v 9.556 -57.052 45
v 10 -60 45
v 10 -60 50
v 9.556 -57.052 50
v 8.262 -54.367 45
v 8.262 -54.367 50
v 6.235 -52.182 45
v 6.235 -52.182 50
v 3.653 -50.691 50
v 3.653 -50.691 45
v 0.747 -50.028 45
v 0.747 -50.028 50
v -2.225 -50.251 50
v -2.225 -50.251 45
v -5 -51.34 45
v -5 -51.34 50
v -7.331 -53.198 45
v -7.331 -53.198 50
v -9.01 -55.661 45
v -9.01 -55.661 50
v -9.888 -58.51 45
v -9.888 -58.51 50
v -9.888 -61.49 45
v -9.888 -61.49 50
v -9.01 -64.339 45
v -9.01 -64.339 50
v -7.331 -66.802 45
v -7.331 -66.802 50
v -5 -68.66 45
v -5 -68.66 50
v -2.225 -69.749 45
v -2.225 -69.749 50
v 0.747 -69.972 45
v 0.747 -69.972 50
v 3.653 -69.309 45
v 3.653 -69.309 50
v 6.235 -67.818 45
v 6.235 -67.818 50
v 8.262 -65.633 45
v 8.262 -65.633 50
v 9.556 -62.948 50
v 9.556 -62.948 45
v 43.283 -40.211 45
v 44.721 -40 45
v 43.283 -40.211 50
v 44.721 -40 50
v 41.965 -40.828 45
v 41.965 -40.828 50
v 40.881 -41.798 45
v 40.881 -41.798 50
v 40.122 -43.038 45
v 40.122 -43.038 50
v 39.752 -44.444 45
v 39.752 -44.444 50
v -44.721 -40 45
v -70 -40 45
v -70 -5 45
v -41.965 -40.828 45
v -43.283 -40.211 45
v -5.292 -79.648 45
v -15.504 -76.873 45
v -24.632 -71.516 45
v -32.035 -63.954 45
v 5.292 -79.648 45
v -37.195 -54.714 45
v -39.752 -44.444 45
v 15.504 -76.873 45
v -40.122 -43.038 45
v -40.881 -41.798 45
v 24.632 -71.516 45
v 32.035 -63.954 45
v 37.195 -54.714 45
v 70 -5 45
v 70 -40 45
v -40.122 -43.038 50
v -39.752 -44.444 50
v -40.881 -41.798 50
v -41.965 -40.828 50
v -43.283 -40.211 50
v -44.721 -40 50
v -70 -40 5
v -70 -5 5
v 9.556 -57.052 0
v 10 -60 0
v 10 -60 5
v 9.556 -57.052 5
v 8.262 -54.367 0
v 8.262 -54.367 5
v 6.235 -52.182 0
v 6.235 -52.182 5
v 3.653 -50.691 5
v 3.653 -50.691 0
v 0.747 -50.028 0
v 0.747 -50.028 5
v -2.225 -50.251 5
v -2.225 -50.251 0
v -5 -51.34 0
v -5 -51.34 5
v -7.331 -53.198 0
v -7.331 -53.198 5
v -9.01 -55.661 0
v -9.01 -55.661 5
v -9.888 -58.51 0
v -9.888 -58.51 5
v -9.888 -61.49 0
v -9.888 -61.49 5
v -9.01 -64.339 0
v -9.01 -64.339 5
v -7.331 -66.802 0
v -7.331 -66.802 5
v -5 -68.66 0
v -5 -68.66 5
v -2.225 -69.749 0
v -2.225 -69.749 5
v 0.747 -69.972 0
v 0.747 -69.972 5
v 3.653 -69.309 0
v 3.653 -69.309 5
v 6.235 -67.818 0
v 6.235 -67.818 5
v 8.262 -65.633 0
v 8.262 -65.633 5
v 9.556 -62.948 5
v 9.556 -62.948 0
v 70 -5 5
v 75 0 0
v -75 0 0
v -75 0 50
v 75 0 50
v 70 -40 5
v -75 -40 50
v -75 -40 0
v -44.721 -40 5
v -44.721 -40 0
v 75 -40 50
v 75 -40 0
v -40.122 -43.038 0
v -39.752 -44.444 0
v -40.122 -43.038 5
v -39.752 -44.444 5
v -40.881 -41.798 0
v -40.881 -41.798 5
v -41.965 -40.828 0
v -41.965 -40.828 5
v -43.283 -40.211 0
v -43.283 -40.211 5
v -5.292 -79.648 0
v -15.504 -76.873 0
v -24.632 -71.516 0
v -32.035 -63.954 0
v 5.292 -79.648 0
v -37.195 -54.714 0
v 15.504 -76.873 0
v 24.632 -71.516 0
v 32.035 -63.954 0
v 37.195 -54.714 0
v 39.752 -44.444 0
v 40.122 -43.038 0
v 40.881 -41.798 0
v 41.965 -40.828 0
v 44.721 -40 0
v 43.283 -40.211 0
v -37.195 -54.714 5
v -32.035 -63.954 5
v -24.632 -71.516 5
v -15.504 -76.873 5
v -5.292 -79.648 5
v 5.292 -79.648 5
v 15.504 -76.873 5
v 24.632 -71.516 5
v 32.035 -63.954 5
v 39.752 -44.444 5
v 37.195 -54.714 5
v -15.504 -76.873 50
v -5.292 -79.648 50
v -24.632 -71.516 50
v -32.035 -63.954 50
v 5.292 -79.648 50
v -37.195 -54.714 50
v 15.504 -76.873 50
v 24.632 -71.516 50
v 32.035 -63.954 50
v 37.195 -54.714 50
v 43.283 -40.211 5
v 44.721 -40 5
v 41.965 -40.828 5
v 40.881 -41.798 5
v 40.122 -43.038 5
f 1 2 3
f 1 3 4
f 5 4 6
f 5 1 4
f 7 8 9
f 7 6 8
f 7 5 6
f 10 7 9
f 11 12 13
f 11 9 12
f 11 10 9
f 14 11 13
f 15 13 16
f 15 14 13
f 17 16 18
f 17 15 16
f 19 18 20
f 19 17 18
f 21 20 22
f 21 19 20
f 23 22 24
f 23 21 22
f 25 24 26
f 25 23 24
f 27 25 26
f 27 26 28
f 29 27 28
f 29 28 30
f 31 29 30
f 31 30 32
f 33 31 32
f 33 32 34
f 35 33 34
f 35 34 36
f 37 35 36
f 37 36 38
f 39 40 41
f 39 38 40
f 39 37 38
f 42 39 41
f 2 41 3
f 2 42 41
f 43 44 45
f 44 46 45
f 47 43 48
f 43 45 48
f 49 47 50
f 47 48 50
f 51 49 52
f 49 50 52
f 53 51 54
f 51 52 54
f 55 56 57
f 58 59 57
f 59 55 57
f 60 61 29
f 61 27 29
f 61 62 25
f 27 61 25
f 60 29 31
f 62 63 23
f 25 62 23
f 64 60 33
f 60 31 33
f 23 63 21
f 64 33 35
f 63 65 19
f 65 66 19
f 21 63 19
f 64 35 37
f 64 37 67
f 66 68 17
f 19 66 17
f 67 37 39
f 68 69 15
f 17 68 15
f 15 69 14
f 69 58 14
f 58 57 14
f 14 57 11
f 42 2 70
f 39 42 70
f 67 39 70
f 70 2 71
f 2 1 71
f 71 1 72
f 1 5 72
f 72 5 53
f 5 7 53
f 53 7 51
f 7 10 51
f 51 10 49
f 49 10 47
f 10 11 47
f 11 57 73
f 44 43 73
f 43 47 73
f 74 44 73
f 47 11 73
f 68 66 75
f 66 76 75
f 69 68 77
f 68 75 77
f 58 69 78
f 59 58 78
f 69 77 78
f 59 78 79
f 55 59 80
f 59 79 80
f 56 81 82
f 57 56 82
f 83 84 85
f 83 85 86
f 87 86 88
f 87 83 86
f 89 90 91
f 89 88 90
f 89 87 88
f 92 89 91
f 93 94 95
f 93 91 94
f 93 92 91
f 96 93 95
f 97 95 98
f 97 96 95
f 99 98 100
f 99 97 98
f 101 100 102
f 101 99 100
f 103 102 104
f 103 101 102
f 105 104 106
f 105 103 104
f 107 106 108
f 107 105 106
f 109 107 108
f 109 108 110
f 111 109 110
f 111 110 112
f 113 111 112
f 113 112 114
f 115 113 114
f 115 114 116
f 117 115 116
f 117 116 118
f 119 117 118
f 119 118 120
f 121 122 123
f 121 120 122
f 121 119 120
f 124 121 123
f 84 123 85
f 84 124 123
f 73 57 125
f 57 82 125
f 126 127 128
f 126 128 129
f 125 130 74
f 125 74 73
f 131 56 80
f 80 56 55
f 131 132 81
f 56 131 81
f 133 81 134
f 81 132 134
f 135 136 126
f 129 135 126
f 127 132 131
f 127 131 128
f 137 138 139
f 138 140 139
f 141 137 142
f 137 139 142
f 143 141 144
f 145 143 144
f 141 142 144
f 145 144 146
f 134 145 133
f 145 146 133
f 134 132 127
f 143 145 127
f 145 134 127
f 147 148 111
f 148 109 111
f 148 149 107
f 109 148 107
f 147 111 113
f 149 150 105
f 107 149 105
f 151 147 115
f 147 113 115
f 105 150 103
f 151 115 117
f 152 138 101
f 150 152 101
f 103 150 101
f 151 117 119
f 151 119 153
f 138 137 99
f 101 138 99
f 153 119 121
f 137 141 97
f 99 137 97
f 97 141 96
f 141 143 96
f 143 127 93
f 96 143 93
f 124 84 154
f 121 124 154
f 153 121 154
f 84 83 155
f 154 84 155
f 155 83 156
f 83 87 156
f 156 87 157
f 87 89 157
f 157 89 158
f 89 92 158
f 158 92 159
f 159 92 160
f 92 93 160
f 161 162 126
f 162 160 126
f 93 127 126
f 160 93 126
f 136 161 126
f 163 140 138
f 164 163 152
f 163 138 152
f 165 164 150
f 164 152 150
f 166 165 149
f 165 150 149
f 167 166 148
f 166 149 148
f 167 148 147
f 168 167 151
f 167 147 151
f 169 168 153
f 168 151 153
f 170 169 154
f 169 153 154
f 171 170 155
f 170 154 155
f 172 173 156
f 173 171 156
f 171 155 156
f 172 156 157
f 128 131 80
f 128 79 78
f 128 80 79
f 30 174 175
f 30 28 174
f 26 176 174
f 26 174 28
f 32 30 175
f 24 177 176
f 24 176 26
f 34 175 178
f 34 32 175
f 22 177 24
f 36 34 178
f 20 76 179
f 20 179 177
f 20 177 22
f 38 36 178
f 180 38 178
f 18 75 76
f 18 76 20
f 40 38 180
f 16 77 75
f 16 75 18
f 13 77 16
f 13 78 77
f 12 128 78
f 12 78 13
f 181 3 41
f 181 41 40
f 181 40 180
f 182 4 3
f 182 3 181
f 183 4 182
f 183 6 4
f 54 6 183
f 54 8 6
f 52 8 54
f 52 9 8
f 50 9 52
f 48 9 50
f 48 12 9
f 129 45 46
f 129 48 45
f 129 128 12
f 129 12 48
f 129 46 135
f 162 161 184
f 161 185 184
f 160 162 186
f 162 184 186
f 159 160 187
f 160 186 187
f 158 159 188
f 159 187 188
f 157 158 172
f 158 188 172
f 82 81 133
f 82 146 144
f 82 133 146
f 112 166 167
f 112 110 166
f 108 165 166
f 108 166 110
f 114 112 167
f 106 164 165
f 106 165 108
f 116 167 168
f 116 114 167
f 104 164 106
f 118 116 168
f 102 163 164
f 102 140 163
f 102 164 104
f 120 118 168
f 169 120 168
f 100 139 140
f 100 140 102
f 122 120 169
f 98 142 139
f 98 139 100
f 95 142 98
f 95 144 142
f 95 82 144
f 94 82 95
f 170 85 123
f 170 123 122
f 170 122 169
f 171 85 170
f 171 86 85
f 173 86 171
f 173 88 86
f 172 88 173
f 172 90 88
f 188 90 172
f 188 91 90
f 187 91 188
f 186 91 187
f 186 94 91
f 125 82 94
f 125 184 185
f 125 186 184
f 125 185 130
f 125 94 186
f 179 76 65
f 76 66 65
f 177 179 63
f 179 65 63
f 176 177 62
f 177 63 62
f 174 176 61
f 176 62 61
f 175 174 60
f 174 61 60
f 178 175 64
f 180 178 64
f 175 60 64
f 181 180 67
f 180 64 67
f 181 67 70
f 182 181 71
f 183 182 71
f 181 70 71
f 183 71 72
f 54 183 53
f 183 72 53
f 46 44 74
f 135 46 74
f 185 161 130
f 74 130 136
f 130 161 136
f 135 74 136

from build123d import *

# Parameters (mm, degrees)
BOSS_EXTRUDE1_DEPTH     = 50
SHELL2_T                = -5
FILLET1_R               = 5
CUT_EXTRUDE2_DEPTH      = 121.519707932
CUT_EXTRUDE2_DEPTH_BACK = 121.519707932
SKETCH1_4_R             = 10


with BuildPart() as part:
    # Sketch1 → Boss-Extrude1 (new body)
    with BuildSketch(Plane.XY):
        with BuildLine():
            Line((75, 0), (-75, 0))
            Line((-75, 0), (-75, -40))
            Line((-75, -40), (-40, -40))
            ThreePointArc((-40, -40), (0, -80), (40, -40))
            Line((40, -40), (75, -40))
            Line((75, -40), (75, 0))
        make_face()
    extrude(amount=BOSS_EXTRUDE1_DEPTH)

    # Shell2
    shell2_openings = [part.faces().sort_by_distance(p)[0] for p in [
        (57.5, -40, 25),
        (0, -80, 25),
        (-57.5, -40, 25),
    ]]
    offset(amount=SHELL2_T, openings=shell2_openings, kind=Kind.INTERSECTION)

    # Fillet1
    fillet1_edges = [part.edges().sort_by_distance(p)[0] for p in [
        (40, -40, 2.5),
        (40, -40, 47.5),
        (-40, -40, 2.5),
        (-40, -40, 47.5),
    ]]
    fillet(fillet1_edges, radius=FILLET1_R)

    # Sketch1<4> → Cut-Extrude2 (cut, two sides: drawn at the far end of the back side and taken through both)
    with BuildSketch(Plane.XY.offset(-CUT_EXTRUDE2_DEPTH_BACK)):
        with Locations((0, -60)):
            Circle(SKETCH1_4_R)
    extrude(amount=CUT_EXTRUDE2_DEPTH + CUT_EXTRUDE2_DEPTH_BACK, mode=Mode.SUBTRACT)


solid = part.part
